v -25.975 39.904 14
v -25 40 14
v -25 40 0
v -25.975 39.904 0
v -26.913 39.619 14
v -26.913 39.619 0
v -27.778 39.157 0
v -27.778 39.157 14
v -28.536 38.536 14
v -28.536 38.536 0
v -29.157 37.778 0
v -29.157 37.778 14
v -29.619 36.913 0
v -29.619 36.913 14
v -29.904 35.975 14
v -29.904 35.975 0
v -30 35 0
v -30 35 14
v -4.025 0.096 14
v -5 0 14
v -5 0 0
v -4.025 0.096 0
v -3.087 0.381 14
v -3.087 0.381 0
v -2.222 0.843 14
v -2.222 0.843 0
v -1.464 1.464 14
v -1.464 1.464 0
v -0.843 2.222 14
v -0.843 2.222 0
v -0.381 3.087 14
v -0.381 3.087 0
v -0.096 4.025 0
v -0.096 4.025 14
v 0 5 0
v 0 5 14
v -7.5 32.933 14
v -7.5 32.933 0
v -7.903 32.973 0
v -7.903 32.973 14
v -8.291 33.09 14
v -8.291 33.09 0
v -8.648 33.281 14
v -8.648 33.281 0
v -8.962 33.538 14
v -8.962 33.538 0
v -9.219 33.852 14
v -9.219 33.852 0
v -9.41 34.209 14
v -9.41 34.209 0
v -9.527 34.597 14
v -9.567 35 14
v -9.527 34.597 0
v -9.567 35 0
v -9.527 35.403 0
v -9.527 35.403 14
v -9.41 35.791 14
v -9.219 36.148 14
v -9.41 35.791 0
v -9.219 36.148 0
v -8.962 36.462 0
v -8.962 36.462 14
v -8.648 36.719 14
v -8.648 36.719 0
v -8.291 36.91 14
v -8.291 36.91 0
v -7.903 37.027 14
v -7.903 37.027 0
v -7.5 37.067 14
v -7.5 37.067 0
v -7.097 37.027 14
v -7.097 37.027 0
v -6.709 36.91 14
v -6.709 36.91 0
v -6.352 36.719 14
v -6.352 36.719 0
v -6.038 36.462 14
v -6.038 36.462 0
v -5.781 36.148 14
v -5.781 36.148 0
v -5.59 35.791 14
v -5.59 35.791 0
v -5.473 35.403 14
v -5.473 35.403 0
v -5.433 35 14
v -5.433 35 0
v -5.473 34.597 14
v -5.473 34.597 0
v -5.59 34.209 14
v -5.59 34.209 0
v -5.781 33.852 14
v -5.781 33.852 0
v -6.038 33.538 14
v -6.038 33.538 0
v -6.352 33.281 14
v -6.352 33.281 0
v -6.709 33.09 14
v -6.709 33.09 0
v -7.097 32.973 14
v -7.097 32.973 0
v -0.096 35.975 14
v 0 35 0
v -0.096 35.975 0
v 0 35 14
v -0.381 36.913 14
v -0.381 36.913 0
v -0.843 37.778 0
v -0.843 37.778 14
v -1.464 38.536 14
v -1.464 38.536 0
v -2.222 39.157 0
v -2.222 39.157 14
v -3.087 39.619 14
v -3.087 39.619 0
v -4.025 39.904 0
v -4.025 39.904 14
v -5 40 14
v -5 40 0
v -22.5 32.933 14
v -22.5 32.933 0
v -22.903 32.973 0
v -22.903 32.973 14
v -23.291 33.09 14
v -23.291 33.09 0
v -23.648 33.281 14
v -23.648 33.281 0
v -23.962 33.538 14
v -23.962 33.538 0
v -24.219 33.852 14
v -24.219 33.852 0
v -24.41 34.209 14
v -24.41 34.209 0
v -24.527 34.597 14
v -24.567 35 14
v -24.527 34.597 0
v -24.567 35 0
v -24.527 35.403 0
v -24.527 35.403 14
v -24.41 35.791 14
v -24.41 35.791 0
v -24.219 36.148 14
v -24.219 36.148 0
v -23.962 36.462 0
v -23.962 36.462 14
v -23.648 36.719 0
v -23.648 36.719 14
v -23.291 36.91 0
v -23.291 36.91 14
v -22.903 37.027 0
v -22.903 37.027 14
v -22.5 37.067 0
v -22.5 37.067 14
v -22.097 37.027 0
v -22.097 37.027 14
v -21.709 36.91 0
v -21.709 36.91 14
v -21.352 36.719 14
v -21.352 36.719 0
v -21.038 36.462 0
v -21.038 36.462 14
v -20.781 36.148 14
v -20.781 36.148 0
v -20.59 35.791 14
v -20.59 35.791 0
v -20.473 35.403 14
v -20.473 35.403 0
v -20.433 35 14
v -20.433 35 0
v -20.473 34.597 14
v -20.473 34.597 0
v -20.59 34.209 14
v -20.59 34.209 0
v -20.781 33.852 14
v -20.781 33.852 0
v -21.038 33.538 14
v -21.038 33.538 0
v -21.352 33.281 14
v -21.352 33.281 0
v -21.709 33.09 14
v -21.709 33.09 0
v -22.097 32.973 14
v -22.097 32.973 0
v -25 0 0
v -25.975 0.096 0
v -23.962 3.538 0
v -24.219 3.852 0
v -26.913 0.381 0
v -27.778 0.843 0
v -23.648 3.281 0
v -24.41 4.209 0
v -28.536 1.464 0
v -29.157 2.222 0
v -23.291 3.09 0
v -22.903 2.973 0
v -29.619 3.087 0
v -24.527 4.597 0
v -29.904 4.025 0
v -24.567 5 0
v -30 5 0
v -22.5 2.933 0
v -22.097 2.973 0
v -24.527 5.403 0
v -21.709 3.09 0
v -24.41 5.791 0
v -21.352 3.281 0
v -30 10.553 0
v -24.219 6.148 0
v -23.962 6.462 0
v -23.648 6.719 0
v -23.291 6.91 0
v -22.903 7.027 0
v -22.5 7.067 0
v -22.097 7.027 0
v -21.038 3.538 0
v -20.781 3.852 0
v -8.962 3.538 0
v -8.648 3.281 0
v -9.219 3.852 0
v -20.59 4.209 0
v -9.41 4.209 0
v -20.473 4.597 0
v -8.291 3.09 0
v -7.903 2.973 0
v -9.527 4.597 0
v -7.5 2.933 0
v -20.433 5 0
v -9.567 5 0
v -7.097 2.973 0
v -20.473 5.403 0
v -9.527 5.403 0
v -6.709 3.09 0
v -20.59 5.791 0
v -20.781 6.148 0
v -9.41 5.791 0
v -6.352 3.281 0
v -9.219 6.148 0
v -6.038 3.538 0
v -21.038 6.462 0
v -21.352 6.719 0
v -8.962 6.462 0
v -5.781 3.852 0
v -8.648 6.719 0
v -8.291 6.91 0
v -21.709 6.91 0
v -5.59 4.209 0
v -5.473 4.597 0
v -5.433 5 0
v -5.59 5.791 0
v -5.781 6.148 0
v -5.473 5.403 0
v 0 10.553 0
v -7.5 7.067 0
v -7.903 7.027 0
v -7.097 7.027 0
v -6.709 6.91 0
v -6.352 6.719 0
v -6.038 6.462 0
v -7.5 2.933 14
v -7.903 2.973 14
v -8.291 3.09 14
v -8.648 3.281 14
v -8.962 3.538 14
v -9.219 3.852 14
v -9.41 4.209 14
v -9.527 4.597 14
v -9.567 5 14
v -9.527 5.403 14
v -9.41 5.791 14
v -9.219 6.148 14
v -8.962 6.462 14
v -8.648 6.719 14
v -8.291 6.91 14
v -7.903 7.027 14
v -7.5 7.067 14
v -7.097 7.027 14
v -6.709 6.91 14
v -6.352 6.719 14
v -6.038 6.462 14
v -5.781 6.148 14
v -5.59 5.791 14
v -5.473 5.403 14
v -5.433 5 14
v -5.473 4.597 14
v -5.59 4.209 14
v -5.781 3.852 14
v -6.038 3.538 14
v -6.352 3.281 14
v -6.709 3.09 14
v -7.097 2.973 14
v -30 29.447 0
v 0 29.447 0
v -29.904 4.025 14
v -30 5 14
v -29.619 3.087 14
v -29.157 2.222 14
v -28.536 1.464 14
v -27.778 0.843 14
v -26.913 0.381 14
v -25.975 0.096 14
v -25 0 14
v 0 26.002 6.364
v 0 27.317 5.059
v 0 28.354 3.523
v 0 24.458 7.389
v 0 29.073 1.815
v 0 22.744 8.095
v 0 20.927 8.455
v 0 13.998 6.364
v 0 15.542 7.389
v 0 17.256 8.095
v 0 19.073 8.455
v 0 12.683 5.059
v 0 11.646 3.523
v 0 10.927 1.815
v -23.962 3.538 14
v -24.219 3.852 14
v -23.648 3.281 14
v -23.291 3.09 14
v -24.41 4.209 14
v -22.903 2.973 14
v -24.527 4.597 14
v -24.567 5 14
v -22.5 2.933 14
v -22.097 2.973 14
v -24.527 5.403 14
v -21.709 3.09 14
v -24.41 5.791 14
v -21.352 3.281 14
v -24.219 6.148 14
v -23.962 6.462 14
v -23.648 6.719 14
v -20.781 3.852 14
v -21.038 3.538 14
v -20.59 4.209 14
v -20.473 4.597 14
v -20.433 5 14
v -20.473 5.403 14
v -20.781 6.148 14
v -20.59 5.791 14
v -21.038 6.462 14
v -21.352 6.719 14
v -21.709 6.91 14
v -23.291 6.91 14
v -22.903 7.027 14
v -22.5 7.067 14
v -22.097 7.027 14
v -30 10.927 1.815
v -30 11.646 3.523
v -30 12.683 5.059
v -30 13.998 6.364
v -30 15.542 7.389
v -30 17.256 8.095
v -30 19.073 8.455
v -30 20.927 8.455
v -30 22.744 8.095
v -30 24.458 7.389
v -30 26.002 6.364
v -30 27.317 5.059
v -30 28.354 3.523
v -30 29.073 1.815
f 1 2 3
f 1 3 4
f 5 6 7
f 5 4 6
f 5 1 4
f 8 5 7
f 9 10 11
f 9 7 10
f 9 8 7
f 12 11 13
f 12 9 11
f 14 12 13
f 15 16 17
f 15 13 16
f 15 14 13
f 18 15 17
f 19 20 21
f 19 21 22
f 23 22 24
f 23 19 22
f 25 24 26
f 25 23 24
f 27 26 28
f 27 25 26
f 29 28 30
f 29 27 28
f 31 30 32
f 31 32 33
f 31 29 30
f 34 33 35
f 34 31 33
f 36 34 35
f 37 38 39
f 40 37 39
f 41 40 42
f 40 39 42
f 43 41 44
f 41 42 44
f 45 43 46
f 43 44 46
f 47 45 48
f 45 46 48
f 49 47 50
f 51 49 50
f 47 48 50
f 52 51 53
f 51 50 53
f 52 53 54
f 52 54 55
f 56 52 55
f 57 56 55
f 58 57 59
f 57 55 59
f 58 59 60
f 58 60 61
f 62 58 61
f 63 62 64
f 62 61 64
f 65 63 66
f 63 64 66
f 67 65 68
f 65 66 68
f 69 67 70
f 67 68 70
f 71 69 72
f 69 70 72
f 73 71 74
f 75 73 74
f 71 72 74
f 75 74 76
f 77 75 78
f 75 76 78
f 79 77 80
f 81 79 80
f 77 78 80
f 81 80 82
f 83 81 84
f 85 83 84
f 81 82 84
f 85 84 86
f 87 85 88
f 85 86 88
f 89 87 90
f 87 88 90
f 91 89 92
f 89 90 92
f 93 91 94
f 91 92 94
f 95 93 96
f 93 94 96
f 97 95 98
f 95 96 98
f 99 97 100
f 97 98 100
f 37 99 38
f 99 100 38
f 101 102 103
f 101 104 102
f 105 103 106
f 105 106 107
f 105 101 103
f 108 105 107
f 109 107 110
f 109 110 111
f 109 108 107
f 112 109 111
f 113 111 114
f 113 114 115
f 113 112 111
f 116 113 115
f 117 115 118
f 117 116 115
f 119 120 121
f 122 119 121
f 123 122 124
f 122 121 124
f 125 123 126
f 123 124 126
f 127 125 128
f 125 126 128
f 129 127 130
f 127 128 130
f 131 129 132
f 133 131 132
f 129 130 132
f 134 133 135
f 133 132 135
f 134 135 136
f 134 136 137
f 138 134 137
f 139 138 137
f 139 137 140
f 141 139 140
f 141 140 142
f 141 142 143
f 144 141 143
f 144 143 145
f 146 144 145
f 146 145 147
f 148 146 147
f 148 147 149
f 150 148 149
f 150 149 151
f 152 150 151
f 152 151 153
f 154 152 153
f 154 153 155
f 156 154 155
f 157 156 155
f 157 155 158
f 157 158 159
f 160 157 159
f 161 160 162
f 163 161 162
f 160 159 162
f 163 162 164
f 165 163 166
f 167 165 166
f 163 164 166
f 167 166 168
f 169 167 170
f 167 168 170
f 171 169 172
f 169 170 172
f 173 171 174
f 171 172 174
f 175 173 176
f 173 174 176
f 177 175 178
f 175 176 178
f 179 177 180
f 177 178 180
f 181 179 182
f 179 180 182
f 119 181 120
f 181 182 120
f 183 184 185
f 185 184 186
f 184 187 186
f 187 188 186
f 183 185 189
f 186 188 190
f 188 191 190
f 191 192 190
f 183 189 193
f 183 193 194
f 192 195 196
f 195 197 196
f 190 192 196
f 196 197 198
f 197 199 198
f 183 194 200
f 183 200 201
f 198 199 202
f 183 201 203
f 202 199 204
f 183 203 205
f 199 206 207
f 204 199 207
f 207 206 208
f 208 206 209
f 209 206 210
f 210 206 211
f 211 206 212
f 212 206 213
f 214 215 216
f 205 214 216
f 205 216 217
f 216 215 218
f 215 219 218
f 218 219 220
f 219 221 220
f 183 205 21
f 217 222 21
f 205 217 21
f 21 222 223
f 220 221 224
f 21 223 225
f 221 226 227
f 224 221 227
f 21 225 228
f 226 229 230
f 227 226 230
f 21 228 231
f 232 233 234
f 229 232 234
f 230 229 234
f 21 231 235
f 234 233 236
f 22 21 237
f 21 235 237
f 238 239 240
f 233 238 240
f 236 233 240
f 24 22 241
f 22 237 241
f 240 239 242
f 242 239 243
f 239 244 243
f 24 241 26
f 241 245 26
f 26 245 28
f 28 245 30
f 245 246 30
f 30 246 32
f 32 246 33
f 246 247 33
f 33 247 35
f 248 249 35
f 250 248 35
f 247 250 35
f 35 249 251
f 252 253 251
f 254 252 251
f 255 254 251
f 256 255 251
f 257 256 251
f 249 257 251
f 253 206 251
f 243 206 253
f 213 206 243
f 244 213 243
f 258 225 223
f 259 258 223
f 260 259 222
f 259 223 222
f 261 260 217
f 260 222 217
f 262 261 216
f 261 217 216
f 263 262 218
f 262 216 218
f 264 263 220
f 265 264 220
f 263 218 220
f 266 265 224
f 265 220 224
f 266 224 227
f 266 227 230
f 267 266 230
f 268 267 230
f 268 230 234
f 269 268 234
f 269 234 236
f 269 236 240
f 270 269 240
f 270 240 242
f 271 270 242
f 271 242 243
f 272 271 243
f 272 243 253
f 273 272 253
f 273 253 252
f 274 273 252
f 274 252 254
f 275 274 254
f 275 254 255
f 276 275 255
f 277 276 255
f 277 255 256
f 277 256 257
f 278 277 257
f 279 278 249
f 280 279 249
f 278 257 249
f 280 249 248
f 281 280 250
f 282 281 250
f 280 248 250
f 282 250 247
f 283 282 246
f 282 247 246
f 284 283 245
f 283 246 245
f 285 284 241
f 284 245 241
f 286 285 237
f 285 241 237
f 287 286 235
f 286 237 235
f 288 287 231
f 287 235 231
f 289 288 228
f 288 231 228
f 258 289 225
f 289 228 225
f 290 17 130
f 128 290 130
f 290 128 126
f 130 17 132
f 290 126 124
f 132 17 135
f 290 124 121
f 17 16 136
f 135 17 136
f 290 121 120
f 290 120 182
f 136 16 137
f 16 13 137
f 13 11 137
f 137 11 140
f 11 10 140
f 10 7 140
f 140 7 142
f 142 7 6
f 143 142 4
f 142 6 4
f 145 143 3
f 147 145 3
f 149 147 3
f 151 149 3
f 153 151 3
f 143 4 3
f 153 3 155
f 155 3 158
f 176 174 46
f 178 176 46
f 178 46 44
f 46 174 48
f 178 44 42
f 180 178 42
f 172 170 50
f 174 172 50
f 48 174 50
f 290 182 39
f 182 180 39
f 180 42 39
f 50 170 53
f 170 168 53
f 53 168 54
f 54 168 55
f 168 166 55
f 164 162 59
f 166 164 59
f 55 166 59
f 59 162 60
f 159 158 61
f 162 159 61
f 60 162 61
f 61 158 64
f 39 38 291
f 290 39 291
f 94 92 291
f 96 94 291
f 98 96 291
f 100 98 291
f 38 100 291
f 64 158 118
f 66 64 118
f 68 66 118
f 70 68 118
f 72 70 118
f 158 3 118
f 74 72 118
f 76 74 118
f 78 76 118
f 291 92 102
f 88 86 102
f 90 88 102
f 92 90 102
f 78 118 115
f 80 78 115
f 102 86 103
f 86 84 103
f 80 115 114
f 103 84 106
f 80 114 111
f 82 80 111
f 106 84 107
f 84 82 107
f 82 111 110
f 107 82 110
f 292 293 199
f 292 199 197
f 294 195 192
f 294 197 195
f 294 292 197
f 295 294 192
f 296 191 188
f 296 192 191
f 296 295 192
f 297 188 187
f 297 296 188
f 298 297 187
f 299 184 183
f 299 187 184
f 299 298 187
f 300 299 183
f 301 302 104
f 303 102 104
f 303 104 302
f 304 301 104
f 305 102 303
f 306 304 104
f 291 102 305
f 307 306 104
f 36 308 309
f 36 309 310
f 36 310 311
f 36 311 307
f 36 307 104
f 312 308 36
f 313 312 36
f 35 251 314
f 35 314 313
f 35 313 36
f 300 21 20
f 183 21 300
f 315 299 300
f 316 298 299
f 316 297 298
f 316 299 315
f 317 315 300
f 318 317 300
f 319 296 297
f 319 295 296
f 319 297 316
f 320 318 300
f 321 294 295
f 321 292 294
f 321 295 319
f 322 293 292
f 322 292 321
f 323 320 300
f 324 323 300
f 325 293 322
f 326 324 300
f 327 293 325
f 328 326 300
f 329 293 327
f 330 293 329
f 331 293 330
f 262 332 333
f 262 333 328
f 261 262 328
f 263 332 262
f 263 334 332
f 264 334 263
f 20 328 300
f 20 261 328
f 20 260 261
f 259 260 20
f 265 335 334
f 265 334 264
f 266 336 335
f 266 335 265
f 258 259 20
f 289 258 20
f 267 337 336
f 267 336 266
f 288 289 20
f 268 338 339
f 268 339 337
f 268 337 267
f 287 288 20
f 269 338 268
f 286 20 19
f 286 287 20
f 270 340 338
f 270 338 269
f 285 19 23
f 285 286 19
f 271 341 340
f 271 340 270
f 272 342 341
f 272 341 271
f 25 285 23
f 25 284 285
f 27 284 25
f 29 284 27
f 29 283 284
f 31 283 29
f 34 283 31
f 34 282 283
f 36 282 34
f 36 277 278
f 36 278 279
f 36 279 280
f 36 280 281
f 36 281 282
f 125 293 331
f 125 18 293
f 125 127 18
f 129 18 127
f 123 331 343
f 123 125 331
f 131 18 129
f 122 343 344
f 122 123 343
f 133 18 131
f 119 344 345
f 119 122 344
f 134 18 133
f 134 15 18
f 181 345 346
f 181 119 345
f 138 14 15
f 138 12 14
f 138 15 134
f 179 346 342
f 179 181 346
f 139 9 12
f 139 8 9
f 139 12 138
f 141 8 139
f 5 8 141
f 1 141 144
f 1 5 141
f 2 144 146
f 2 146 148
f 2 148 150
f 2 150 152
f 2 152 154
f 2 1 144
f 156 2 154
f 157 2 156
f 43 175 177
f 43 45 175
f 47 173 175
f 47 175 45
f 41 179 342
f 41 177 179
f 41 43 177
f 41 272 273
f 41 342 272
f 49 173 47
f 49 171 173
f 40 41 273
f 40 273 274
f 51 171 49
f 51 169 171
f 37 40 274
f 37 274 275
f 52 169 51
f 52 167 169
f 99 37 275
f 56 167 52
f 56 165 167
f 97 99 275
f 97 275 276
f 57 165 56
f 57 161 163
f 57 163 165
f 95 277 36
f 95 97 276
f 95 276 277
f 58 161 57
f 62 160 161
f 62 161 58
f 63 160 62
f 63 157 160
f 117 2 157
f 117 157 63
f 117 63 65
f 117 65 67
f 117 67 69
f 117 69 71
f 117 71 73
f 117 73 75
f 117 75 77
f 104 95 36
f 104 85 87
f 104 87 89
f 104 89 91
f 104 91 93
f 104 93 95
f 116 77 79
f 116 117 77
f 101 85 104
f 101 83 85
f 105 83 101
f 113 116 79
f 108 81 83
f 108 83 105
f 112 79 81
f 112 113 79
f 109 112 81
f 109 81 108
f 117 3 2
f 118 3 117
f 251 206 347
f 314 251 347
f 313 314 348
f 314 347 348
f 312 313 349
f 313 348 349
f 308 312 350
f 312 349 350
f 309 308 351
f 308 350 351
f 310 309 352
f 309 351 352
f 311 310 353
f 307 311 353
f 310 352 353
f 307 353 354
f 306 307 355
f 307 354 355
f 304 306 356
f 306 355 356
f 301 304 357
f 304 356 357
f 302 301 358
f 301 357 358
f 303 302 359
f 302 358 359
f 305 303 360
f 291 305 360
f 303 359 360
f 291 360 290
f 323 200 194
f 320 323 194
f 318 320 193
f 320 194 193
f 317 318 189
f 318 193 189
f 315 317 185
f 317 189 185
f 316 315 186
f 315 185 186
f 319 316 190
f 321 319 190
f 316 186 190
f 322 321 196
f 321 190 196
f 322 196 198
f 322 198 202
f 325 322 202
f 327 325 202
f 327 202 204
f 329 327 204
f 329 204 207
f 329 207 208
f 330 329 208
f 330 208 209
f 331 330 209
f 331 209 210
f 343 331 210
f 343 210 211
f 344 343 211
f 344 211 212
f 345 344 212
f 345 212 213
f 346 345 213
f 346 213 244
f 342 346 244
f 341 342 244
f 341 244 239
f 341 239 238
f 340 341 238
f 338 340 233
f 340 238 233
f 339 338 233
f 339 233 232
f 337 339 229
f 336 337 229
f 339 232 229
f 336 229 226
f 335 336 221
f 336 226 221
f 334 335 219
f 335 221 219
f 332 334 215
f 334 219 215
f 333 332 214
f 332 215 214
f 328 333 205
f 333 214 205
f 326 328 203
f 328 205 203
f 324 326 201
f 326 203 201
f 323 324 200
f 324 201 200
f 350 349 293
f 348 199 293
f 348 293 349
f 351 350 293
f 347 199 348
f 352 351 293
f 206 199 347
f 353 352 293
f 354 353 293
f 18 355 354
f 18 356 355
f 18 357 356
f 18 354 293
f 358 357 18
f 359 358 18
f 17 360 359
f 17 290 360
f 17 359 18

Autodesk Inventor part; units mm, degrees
ref_plane "YZ Plane" through (0, 0, 0) normal (1, 0, 0) x (0, 1, 0)
ref_plane "XZ Plane" through (0, 0, 0) normal (0, 1, 0) x (-1, 0, 0)
ref_plane "XY Plane" through (0, 0, 0) normal (0, 0, 1) x (1, 0, 0)
sketch "Sketch4" plane through (0, 0, 0) normal (0, 0, 1) x (1, 0, 0)
  line L0 (0, 0) -> (-30, 0)
  line L1 (-30, 0) -> (-30, 40)
  line L2 (-30, 40) -> (0, 40)
  line L3 (0, 40) -> (0, 0)
  dimension "d37" = 30
  dimension "d38" = 40
extrude "Extrusion2" add sketch "Sketch4" along normal blind 14
hole "Hole3" at (-22.5, 35, 14) direction (0, 0, -1) diameter 4.134 depth 14.2 tip angle 118 thread size "M5x0.8" class "6H" standard "ISO Metric profile"
hole "Hole4" at (-7.5, 35, 14) direction (0, 0, -1) diameter 4.134 depth 14.2 tip angle 118 thread size "M5x0.8" class "6H" standard "ANSI Metric M Profile"
hole "Hole5" at (-7.5, 5, 14) direction (0, 0, -1) diameter 4.134 depth 14.2 tip angle 118 thread size "M5x0.8" class "6H" standard "ANSI Metric M Profile"
hole "Hole6" at (-22.5, 5, 14) direction (0, 0, -1) diameter 4.134 depth 14.2 tip angle 118 thread size "M5x0.8" class "6H" standard "ANSI Metric M Profile"
hole "Hole7" at (0, 20, -1) direction (-1, 0, 0) diameter 19 end through all
fillet "Fillet1" radius 5 4 edges at (-30, 40, 7) (0, 40, 7) (0, 0, 7) (-30, 0, 7)
properties part number "GARFO" material "Aluminium AW-7020"
